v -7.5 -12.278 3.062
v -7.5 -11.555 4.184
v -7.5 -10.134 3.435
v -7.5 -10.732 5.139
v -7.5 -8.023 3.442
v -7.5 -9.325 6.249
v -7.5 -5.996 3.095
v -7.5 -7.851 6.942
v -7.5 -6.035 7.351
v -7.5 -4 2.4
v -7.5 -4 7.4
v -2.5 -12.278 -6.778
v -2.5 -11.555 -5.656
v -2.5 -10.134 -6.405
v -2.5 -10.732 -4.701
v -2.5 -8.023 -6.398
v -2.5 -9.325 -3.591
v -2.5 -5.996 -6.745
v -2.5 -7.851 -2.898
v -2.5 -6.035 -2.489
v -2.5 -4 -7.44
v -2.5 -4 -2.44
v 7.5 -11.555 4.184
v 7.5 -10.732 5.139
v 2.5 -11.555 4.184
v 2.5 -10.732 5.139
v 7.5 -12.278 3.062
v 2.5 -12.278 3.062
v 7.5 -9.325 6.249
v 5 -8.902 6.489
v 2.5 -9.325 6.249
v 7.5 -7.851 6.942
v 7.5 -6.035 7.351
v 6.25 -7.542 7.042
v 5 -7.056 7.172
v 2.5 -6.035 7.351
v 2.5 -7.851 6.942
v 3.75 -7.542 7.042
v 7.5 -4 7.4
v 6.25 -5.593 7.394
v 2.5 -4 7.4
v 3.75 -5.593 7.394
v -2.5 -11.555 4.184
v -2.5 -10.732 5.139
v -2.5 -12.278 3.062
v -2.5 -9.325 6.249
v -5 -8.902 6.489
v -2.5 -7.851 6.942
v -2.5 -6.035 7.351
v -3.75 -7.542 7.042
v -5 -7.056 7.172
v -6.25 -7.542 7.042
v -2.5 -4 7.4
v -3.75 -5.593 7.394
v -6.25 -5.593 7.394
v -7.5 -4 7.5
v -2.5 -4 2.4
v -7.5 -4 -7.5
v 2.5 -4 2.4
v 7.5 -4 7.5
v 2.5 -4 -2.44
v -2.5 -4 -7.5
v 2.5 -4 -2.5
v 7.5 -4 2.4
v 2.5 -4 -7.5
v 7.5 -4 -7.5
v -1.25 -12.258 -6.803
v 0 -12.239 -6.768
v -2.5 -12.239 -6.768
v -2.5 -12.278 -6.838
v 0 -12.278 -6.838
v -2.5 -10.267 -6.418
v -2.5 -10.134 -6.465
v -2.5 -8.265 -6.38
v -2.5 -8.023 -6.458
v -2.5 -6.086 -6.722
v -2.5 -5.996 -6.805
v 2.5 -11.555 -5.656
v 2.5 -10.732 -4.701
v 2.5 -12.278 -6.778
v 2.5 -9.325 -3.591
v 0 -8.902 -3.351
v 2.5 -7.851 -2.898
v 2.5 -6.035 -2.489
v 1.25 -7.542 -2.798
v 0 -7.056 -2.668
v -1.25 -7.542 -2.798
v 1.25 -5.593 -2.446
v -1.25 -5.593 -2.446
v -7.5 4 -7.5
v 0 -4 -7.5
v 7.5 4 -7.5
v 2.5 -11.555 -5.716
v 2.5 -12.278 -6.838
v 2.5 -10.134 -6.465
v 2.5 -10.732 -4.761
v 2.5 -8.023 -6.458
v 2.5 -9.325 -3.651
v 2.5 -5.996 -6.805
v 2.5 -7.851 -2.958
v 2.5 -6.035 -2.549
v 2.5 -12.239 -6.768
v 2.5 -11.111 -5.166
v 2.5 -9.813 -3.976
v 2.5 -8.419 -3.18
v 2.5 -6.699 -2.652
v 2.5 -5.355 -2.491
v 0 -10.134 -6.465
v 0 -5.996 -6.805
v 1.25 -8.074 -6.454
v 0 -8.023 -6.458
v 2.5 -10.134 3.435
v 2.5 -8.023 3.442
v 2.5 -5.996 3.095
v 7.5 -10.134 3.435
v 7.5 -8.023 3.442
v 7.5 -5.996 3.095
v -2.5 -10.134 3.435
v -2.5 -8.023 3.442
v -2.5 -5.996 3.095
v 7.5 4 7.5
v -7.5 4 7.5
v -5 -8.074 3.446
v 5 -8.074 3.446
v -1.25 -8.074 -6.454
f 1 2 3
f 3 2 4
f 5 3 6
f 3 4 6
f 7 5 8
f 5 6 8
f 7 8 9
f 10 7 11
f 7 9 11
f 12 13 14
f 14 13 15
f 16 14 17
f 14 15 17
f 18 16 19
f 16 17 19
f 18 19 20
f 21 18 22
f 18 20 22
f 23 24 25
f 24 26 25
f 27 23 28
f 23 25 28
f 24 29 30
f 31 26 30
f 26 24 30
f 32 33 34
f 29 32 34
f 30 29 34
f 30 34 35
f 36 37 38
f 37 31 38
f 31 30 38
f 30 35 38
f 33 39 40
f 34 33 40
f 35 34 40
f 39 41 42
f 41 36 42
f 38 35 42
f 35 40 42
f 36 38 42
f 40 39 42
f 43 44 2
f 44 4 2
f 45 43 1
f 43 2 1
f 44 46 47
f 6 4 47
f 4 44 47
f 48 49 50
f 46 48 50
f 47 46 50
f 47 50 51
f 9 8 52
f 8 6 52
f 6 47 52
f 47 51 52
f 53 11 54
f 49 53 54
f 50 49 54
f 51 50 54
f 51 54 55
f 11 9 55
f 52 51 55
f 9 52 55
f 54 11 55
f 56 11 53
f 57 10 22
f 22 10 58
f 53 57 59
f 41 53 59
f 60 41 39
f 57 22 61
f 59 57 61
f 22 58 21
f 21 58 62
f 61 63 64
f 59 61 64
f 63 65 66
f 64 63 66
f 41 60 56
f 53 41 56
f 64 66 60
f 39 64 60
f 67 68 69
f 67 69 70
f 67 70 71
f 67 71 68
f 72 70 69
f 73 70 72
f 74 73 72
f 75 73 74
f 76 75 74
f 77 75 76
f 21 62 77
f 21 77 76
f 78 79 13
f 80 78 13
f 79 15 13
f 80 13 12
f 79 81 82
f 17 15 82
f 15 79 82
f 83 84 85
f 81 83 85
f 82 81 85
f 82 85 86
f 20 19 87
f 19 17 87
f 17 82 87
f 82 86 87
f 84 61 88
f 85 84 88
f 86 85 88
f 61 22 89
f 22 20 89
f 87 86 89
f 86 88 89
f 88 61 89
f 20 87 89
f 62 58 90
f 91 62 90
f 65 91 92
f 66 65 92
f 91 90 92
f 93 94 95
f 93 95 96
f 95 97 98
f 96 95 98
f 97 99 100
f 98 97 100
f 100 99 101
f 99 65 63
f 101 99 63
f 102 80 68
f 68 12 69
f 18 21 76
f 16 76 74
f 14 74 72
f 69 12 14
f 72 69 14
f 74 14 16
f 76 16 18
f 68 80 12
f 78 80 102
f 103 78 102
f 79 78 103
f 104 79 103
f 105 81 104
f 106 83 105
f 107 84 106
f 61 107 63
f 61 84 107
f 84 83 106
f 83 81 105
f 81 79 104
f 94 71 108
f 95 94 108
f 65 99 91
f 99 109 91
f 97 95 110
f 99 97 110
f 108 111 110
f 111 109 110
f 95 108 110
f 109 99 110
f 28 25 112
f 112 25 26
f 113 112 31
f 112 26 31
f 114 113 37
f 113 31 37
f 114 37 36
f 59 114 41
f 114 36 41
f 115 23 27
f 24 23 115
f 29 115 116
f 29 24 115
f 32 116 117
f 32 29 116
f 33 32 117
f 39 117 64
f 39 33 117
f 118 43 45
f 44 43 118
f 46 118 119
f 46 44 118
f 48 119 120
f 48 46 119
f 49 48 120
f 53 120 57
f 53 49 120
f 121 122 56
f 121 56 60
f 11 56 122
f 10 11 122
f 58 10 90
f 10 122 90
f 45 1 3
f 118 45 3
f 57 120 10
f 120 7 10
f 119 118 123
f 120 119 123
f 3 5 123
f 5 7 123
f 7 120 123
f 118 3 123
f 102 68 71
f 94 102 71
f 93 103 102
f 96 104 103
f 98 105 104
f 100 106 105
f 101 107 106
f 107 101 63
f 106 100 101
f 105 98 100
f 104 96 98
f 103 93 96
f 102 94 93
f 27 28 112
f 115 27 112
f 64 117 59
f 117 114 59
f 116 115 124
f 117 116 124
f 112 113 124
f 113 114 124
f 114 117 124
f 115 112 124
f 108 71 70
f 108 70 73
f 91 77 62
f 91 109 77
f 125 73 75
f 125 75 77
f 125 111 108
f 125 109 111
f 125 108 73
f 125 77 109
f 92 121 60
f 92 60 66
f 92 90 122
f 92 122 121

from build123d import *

# Parameters (mm, degrees)
SKETCH_1_W               = 15
SKETCH_1_H               = 15
EXTRUDE_1_DEPTH          = 4
EXTRUDE_2_DEPTH          = 2.5
PATTERN_START            = -7.500040123
PATTERN_SKETCH_2_DEPTH   = 5
PATTERN_START_2          = 2.499959877
PATTERN_SKETCH_2_2_DEPTH = 5
PATTERN_START_3          = -2.500040123
PATTERN_SKETCH_2_3_DEPTH = 5


with BuildPart() as part:
    # 스케치1 → 보스-돌출1 (new, symmetric)
    with BuildSketch(Plane(origin=(0, 0, 0), x_dir=(1, 0, 0), z_dir=(0, 1, 0))):
        Rectangle(SKETCH_1_W, SKETCH_1_H)
    extrude(amount=EXTRUDE_1_DEPTH, both=True)

    # 스케치3 → 보스-돌출2 (add, symmetric)
    with BuildSketch(Plane(origin=(0, 0, 0), x_dir=(0, 0, -1), z_dir=(1, 0, 0))):
        with BuildLine():
            Line((2.5, -4), (7.5, -4))
            add(Edge.make_bspline(
                [(6.837946582, -12.278081575), (5.73941202, -8.009656666), (7.5, -4)],
                knots=[0, 0, 0, 1, 1, 1], degree=2))
            add(Edge.make_bspline(
                [(2.5, -4), (2.152812134, -9.664313578), (6.837946582, -12.278081575)],
                knots=[0, 0, 0, 1, 1, 1], degree=2))
        make_face()
    extrude(amount=EXTRUDE_2_DEPTH, both=True)

    # 스케치 패턴2: read off the stored shape, not the designer's step
    # 스케치 패턴2 outline → 스케치 패턴2 (add)
    with BuildSketch(Plane.YZ.offset(PATTERN_START)):
        with BuildLine():
            Line((-4, 2.400000403), (-4, 7.400000403))
            add(Edge.make_bspline(
                [(-4, 7.400000403), (-9.664313578, 7.747188269), (-12.278081575, 3.062053822)],
                knots=[0, 0, 0, 1, 1, 1], degree=2))
            add(Edge.make_bspline(
                [(-12.278081575, 3.062053822), (-8.009656666, 4.160588383), (-4, 2.400000403)],
                knots=[0, 0, 0, 1, 1, 1], degree=2))
        make_face()
    extrude(amount=PATTERN_SKETCH_2_DEPTH)

    # Pattern Sketch 2 2 outline → Pattern Sketch 2 2 (add)
    with BuildSketch(Plane.YZ.offset(PATTERN_START_2)):
        with BuildLine():
            Line((-4, 2.400000403), (-4, 7.400000403))
            add(Edge.make_bspline(
                [(-4, 7.400000403), (-9.664313578, 7.747188269), (-12.278081575, 3.062053822)],
                knots=[0, 0, 0, 1, 1, 1], degree=2))
            add(Edge.make_bspline(
                [(-12.278081575, 3.062053822), (-8.009656666, 4.160588383), (-4, 2.400000403)],
                knots=[0, 0, 0, 1, 1, 1], degree=2))
        make_face()
    extrude(amount=PATTERN_SKETCH_2_2_DEPTH)

    # Pattern Sketch 2 3 outline → Pattern Sketch 2 3 (add)
    with BuildSketch(Plane.YZ.offset(PATTERN_START_3)):
        with BuildLine():
            add(Edge.make_bspline(
                [(-4, -2.439999597), (-9.664313578, -2.092811731), (-12.278081575, -6.777946178)],
                knots=[0, 0, 0, 1, 1, 1], degree=2))
            add(Edge.make_bspline(
                [(-12.278081575, -6.777946178), (-8.009656666, -5.679411617), (-4, -7.439999597)],
                knots=[0, 0, 0, 1, 1, 1], degree=2))
            Line((-4, -7.439999597), (-4, -2.439999597))
        make_face()
    extrude(amount=PATTERN_SKETCH_2_3_DEPTH)


solid = part.part
